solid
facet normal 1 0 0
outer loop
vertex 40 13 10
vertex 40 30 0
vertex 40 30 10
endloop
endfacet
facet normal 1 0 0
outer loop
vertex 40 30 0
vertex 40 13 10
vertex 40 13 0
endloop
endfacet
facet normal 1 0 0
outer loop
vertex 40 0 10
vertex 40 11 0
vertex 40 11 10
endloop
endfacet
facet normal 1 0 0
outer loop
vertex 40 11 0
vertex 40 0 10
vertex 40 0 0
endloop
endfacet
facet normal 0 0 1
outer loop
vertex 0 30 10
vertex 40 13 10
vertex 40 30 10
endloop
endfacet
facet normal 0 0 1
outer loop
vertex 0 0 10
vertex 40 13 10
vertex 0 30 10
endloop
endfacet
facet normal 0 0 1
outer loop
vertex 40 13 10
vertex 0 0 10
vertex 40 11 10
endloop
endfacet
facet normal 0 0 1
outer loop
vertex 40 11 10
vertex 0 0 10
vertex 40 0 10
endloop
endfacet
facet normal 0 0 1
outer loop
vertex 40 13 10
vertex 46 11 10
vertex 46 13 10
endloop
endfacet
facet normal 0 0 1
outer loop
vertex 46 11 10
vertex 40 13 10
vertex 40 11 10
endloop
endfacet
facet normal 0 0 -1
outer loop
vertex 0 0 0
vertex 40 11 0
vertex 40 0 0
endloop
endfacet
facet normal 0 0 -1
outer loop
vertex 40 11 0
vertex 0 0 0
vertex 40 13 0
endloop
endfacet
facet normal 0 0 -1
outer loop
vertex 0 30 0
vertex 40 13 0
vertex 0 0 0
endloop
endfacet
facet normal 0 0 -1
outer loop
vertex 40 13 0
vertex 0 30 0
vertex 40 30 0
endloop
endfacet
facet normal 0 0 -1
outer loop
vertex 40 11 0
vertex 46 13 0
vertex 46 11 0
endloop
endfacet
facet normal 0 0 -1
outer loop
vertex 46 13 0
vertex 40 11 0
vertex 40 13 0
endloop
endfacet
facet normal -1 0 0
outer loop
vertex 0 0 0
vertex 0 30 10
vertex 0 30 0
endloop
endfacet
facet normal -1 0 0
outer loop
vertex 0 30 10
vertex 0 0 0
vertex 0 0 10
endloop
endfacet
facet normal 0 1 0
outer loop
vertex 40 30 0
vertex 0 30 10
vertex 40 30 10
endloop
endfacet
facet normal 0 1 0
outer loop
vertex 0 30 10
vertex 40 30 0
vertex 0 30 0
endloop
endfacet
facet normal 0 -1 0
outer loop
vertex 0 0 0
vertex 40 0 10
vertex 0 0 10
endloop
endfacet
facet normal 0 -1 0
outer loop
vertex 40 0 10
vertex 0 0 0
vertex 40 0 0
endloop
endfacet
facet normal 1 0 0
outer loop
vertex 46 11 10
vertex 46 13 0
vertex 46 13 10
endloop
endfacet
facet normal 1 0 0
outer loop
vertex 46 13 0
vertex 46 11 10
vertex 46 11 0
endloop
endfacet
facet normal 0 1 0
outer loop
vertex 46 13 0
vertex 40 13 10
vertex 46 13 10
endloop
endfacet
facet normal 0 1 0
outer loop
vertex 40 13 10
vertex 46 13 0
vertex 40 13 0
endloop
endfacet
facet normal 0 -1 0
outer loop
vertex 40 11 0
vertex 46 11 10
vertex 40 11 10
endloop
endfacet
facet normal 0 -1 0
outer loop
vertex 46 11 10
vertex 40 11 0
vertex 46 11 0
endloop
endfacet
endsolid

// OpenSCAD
// units=mm — generated by scad_emitter.py
// part=unnamed
$fn = 48;

union() { cube([40, 30, 10]); translate([39.5, 11, 0]) cube([6.5, 2, 10]); }
